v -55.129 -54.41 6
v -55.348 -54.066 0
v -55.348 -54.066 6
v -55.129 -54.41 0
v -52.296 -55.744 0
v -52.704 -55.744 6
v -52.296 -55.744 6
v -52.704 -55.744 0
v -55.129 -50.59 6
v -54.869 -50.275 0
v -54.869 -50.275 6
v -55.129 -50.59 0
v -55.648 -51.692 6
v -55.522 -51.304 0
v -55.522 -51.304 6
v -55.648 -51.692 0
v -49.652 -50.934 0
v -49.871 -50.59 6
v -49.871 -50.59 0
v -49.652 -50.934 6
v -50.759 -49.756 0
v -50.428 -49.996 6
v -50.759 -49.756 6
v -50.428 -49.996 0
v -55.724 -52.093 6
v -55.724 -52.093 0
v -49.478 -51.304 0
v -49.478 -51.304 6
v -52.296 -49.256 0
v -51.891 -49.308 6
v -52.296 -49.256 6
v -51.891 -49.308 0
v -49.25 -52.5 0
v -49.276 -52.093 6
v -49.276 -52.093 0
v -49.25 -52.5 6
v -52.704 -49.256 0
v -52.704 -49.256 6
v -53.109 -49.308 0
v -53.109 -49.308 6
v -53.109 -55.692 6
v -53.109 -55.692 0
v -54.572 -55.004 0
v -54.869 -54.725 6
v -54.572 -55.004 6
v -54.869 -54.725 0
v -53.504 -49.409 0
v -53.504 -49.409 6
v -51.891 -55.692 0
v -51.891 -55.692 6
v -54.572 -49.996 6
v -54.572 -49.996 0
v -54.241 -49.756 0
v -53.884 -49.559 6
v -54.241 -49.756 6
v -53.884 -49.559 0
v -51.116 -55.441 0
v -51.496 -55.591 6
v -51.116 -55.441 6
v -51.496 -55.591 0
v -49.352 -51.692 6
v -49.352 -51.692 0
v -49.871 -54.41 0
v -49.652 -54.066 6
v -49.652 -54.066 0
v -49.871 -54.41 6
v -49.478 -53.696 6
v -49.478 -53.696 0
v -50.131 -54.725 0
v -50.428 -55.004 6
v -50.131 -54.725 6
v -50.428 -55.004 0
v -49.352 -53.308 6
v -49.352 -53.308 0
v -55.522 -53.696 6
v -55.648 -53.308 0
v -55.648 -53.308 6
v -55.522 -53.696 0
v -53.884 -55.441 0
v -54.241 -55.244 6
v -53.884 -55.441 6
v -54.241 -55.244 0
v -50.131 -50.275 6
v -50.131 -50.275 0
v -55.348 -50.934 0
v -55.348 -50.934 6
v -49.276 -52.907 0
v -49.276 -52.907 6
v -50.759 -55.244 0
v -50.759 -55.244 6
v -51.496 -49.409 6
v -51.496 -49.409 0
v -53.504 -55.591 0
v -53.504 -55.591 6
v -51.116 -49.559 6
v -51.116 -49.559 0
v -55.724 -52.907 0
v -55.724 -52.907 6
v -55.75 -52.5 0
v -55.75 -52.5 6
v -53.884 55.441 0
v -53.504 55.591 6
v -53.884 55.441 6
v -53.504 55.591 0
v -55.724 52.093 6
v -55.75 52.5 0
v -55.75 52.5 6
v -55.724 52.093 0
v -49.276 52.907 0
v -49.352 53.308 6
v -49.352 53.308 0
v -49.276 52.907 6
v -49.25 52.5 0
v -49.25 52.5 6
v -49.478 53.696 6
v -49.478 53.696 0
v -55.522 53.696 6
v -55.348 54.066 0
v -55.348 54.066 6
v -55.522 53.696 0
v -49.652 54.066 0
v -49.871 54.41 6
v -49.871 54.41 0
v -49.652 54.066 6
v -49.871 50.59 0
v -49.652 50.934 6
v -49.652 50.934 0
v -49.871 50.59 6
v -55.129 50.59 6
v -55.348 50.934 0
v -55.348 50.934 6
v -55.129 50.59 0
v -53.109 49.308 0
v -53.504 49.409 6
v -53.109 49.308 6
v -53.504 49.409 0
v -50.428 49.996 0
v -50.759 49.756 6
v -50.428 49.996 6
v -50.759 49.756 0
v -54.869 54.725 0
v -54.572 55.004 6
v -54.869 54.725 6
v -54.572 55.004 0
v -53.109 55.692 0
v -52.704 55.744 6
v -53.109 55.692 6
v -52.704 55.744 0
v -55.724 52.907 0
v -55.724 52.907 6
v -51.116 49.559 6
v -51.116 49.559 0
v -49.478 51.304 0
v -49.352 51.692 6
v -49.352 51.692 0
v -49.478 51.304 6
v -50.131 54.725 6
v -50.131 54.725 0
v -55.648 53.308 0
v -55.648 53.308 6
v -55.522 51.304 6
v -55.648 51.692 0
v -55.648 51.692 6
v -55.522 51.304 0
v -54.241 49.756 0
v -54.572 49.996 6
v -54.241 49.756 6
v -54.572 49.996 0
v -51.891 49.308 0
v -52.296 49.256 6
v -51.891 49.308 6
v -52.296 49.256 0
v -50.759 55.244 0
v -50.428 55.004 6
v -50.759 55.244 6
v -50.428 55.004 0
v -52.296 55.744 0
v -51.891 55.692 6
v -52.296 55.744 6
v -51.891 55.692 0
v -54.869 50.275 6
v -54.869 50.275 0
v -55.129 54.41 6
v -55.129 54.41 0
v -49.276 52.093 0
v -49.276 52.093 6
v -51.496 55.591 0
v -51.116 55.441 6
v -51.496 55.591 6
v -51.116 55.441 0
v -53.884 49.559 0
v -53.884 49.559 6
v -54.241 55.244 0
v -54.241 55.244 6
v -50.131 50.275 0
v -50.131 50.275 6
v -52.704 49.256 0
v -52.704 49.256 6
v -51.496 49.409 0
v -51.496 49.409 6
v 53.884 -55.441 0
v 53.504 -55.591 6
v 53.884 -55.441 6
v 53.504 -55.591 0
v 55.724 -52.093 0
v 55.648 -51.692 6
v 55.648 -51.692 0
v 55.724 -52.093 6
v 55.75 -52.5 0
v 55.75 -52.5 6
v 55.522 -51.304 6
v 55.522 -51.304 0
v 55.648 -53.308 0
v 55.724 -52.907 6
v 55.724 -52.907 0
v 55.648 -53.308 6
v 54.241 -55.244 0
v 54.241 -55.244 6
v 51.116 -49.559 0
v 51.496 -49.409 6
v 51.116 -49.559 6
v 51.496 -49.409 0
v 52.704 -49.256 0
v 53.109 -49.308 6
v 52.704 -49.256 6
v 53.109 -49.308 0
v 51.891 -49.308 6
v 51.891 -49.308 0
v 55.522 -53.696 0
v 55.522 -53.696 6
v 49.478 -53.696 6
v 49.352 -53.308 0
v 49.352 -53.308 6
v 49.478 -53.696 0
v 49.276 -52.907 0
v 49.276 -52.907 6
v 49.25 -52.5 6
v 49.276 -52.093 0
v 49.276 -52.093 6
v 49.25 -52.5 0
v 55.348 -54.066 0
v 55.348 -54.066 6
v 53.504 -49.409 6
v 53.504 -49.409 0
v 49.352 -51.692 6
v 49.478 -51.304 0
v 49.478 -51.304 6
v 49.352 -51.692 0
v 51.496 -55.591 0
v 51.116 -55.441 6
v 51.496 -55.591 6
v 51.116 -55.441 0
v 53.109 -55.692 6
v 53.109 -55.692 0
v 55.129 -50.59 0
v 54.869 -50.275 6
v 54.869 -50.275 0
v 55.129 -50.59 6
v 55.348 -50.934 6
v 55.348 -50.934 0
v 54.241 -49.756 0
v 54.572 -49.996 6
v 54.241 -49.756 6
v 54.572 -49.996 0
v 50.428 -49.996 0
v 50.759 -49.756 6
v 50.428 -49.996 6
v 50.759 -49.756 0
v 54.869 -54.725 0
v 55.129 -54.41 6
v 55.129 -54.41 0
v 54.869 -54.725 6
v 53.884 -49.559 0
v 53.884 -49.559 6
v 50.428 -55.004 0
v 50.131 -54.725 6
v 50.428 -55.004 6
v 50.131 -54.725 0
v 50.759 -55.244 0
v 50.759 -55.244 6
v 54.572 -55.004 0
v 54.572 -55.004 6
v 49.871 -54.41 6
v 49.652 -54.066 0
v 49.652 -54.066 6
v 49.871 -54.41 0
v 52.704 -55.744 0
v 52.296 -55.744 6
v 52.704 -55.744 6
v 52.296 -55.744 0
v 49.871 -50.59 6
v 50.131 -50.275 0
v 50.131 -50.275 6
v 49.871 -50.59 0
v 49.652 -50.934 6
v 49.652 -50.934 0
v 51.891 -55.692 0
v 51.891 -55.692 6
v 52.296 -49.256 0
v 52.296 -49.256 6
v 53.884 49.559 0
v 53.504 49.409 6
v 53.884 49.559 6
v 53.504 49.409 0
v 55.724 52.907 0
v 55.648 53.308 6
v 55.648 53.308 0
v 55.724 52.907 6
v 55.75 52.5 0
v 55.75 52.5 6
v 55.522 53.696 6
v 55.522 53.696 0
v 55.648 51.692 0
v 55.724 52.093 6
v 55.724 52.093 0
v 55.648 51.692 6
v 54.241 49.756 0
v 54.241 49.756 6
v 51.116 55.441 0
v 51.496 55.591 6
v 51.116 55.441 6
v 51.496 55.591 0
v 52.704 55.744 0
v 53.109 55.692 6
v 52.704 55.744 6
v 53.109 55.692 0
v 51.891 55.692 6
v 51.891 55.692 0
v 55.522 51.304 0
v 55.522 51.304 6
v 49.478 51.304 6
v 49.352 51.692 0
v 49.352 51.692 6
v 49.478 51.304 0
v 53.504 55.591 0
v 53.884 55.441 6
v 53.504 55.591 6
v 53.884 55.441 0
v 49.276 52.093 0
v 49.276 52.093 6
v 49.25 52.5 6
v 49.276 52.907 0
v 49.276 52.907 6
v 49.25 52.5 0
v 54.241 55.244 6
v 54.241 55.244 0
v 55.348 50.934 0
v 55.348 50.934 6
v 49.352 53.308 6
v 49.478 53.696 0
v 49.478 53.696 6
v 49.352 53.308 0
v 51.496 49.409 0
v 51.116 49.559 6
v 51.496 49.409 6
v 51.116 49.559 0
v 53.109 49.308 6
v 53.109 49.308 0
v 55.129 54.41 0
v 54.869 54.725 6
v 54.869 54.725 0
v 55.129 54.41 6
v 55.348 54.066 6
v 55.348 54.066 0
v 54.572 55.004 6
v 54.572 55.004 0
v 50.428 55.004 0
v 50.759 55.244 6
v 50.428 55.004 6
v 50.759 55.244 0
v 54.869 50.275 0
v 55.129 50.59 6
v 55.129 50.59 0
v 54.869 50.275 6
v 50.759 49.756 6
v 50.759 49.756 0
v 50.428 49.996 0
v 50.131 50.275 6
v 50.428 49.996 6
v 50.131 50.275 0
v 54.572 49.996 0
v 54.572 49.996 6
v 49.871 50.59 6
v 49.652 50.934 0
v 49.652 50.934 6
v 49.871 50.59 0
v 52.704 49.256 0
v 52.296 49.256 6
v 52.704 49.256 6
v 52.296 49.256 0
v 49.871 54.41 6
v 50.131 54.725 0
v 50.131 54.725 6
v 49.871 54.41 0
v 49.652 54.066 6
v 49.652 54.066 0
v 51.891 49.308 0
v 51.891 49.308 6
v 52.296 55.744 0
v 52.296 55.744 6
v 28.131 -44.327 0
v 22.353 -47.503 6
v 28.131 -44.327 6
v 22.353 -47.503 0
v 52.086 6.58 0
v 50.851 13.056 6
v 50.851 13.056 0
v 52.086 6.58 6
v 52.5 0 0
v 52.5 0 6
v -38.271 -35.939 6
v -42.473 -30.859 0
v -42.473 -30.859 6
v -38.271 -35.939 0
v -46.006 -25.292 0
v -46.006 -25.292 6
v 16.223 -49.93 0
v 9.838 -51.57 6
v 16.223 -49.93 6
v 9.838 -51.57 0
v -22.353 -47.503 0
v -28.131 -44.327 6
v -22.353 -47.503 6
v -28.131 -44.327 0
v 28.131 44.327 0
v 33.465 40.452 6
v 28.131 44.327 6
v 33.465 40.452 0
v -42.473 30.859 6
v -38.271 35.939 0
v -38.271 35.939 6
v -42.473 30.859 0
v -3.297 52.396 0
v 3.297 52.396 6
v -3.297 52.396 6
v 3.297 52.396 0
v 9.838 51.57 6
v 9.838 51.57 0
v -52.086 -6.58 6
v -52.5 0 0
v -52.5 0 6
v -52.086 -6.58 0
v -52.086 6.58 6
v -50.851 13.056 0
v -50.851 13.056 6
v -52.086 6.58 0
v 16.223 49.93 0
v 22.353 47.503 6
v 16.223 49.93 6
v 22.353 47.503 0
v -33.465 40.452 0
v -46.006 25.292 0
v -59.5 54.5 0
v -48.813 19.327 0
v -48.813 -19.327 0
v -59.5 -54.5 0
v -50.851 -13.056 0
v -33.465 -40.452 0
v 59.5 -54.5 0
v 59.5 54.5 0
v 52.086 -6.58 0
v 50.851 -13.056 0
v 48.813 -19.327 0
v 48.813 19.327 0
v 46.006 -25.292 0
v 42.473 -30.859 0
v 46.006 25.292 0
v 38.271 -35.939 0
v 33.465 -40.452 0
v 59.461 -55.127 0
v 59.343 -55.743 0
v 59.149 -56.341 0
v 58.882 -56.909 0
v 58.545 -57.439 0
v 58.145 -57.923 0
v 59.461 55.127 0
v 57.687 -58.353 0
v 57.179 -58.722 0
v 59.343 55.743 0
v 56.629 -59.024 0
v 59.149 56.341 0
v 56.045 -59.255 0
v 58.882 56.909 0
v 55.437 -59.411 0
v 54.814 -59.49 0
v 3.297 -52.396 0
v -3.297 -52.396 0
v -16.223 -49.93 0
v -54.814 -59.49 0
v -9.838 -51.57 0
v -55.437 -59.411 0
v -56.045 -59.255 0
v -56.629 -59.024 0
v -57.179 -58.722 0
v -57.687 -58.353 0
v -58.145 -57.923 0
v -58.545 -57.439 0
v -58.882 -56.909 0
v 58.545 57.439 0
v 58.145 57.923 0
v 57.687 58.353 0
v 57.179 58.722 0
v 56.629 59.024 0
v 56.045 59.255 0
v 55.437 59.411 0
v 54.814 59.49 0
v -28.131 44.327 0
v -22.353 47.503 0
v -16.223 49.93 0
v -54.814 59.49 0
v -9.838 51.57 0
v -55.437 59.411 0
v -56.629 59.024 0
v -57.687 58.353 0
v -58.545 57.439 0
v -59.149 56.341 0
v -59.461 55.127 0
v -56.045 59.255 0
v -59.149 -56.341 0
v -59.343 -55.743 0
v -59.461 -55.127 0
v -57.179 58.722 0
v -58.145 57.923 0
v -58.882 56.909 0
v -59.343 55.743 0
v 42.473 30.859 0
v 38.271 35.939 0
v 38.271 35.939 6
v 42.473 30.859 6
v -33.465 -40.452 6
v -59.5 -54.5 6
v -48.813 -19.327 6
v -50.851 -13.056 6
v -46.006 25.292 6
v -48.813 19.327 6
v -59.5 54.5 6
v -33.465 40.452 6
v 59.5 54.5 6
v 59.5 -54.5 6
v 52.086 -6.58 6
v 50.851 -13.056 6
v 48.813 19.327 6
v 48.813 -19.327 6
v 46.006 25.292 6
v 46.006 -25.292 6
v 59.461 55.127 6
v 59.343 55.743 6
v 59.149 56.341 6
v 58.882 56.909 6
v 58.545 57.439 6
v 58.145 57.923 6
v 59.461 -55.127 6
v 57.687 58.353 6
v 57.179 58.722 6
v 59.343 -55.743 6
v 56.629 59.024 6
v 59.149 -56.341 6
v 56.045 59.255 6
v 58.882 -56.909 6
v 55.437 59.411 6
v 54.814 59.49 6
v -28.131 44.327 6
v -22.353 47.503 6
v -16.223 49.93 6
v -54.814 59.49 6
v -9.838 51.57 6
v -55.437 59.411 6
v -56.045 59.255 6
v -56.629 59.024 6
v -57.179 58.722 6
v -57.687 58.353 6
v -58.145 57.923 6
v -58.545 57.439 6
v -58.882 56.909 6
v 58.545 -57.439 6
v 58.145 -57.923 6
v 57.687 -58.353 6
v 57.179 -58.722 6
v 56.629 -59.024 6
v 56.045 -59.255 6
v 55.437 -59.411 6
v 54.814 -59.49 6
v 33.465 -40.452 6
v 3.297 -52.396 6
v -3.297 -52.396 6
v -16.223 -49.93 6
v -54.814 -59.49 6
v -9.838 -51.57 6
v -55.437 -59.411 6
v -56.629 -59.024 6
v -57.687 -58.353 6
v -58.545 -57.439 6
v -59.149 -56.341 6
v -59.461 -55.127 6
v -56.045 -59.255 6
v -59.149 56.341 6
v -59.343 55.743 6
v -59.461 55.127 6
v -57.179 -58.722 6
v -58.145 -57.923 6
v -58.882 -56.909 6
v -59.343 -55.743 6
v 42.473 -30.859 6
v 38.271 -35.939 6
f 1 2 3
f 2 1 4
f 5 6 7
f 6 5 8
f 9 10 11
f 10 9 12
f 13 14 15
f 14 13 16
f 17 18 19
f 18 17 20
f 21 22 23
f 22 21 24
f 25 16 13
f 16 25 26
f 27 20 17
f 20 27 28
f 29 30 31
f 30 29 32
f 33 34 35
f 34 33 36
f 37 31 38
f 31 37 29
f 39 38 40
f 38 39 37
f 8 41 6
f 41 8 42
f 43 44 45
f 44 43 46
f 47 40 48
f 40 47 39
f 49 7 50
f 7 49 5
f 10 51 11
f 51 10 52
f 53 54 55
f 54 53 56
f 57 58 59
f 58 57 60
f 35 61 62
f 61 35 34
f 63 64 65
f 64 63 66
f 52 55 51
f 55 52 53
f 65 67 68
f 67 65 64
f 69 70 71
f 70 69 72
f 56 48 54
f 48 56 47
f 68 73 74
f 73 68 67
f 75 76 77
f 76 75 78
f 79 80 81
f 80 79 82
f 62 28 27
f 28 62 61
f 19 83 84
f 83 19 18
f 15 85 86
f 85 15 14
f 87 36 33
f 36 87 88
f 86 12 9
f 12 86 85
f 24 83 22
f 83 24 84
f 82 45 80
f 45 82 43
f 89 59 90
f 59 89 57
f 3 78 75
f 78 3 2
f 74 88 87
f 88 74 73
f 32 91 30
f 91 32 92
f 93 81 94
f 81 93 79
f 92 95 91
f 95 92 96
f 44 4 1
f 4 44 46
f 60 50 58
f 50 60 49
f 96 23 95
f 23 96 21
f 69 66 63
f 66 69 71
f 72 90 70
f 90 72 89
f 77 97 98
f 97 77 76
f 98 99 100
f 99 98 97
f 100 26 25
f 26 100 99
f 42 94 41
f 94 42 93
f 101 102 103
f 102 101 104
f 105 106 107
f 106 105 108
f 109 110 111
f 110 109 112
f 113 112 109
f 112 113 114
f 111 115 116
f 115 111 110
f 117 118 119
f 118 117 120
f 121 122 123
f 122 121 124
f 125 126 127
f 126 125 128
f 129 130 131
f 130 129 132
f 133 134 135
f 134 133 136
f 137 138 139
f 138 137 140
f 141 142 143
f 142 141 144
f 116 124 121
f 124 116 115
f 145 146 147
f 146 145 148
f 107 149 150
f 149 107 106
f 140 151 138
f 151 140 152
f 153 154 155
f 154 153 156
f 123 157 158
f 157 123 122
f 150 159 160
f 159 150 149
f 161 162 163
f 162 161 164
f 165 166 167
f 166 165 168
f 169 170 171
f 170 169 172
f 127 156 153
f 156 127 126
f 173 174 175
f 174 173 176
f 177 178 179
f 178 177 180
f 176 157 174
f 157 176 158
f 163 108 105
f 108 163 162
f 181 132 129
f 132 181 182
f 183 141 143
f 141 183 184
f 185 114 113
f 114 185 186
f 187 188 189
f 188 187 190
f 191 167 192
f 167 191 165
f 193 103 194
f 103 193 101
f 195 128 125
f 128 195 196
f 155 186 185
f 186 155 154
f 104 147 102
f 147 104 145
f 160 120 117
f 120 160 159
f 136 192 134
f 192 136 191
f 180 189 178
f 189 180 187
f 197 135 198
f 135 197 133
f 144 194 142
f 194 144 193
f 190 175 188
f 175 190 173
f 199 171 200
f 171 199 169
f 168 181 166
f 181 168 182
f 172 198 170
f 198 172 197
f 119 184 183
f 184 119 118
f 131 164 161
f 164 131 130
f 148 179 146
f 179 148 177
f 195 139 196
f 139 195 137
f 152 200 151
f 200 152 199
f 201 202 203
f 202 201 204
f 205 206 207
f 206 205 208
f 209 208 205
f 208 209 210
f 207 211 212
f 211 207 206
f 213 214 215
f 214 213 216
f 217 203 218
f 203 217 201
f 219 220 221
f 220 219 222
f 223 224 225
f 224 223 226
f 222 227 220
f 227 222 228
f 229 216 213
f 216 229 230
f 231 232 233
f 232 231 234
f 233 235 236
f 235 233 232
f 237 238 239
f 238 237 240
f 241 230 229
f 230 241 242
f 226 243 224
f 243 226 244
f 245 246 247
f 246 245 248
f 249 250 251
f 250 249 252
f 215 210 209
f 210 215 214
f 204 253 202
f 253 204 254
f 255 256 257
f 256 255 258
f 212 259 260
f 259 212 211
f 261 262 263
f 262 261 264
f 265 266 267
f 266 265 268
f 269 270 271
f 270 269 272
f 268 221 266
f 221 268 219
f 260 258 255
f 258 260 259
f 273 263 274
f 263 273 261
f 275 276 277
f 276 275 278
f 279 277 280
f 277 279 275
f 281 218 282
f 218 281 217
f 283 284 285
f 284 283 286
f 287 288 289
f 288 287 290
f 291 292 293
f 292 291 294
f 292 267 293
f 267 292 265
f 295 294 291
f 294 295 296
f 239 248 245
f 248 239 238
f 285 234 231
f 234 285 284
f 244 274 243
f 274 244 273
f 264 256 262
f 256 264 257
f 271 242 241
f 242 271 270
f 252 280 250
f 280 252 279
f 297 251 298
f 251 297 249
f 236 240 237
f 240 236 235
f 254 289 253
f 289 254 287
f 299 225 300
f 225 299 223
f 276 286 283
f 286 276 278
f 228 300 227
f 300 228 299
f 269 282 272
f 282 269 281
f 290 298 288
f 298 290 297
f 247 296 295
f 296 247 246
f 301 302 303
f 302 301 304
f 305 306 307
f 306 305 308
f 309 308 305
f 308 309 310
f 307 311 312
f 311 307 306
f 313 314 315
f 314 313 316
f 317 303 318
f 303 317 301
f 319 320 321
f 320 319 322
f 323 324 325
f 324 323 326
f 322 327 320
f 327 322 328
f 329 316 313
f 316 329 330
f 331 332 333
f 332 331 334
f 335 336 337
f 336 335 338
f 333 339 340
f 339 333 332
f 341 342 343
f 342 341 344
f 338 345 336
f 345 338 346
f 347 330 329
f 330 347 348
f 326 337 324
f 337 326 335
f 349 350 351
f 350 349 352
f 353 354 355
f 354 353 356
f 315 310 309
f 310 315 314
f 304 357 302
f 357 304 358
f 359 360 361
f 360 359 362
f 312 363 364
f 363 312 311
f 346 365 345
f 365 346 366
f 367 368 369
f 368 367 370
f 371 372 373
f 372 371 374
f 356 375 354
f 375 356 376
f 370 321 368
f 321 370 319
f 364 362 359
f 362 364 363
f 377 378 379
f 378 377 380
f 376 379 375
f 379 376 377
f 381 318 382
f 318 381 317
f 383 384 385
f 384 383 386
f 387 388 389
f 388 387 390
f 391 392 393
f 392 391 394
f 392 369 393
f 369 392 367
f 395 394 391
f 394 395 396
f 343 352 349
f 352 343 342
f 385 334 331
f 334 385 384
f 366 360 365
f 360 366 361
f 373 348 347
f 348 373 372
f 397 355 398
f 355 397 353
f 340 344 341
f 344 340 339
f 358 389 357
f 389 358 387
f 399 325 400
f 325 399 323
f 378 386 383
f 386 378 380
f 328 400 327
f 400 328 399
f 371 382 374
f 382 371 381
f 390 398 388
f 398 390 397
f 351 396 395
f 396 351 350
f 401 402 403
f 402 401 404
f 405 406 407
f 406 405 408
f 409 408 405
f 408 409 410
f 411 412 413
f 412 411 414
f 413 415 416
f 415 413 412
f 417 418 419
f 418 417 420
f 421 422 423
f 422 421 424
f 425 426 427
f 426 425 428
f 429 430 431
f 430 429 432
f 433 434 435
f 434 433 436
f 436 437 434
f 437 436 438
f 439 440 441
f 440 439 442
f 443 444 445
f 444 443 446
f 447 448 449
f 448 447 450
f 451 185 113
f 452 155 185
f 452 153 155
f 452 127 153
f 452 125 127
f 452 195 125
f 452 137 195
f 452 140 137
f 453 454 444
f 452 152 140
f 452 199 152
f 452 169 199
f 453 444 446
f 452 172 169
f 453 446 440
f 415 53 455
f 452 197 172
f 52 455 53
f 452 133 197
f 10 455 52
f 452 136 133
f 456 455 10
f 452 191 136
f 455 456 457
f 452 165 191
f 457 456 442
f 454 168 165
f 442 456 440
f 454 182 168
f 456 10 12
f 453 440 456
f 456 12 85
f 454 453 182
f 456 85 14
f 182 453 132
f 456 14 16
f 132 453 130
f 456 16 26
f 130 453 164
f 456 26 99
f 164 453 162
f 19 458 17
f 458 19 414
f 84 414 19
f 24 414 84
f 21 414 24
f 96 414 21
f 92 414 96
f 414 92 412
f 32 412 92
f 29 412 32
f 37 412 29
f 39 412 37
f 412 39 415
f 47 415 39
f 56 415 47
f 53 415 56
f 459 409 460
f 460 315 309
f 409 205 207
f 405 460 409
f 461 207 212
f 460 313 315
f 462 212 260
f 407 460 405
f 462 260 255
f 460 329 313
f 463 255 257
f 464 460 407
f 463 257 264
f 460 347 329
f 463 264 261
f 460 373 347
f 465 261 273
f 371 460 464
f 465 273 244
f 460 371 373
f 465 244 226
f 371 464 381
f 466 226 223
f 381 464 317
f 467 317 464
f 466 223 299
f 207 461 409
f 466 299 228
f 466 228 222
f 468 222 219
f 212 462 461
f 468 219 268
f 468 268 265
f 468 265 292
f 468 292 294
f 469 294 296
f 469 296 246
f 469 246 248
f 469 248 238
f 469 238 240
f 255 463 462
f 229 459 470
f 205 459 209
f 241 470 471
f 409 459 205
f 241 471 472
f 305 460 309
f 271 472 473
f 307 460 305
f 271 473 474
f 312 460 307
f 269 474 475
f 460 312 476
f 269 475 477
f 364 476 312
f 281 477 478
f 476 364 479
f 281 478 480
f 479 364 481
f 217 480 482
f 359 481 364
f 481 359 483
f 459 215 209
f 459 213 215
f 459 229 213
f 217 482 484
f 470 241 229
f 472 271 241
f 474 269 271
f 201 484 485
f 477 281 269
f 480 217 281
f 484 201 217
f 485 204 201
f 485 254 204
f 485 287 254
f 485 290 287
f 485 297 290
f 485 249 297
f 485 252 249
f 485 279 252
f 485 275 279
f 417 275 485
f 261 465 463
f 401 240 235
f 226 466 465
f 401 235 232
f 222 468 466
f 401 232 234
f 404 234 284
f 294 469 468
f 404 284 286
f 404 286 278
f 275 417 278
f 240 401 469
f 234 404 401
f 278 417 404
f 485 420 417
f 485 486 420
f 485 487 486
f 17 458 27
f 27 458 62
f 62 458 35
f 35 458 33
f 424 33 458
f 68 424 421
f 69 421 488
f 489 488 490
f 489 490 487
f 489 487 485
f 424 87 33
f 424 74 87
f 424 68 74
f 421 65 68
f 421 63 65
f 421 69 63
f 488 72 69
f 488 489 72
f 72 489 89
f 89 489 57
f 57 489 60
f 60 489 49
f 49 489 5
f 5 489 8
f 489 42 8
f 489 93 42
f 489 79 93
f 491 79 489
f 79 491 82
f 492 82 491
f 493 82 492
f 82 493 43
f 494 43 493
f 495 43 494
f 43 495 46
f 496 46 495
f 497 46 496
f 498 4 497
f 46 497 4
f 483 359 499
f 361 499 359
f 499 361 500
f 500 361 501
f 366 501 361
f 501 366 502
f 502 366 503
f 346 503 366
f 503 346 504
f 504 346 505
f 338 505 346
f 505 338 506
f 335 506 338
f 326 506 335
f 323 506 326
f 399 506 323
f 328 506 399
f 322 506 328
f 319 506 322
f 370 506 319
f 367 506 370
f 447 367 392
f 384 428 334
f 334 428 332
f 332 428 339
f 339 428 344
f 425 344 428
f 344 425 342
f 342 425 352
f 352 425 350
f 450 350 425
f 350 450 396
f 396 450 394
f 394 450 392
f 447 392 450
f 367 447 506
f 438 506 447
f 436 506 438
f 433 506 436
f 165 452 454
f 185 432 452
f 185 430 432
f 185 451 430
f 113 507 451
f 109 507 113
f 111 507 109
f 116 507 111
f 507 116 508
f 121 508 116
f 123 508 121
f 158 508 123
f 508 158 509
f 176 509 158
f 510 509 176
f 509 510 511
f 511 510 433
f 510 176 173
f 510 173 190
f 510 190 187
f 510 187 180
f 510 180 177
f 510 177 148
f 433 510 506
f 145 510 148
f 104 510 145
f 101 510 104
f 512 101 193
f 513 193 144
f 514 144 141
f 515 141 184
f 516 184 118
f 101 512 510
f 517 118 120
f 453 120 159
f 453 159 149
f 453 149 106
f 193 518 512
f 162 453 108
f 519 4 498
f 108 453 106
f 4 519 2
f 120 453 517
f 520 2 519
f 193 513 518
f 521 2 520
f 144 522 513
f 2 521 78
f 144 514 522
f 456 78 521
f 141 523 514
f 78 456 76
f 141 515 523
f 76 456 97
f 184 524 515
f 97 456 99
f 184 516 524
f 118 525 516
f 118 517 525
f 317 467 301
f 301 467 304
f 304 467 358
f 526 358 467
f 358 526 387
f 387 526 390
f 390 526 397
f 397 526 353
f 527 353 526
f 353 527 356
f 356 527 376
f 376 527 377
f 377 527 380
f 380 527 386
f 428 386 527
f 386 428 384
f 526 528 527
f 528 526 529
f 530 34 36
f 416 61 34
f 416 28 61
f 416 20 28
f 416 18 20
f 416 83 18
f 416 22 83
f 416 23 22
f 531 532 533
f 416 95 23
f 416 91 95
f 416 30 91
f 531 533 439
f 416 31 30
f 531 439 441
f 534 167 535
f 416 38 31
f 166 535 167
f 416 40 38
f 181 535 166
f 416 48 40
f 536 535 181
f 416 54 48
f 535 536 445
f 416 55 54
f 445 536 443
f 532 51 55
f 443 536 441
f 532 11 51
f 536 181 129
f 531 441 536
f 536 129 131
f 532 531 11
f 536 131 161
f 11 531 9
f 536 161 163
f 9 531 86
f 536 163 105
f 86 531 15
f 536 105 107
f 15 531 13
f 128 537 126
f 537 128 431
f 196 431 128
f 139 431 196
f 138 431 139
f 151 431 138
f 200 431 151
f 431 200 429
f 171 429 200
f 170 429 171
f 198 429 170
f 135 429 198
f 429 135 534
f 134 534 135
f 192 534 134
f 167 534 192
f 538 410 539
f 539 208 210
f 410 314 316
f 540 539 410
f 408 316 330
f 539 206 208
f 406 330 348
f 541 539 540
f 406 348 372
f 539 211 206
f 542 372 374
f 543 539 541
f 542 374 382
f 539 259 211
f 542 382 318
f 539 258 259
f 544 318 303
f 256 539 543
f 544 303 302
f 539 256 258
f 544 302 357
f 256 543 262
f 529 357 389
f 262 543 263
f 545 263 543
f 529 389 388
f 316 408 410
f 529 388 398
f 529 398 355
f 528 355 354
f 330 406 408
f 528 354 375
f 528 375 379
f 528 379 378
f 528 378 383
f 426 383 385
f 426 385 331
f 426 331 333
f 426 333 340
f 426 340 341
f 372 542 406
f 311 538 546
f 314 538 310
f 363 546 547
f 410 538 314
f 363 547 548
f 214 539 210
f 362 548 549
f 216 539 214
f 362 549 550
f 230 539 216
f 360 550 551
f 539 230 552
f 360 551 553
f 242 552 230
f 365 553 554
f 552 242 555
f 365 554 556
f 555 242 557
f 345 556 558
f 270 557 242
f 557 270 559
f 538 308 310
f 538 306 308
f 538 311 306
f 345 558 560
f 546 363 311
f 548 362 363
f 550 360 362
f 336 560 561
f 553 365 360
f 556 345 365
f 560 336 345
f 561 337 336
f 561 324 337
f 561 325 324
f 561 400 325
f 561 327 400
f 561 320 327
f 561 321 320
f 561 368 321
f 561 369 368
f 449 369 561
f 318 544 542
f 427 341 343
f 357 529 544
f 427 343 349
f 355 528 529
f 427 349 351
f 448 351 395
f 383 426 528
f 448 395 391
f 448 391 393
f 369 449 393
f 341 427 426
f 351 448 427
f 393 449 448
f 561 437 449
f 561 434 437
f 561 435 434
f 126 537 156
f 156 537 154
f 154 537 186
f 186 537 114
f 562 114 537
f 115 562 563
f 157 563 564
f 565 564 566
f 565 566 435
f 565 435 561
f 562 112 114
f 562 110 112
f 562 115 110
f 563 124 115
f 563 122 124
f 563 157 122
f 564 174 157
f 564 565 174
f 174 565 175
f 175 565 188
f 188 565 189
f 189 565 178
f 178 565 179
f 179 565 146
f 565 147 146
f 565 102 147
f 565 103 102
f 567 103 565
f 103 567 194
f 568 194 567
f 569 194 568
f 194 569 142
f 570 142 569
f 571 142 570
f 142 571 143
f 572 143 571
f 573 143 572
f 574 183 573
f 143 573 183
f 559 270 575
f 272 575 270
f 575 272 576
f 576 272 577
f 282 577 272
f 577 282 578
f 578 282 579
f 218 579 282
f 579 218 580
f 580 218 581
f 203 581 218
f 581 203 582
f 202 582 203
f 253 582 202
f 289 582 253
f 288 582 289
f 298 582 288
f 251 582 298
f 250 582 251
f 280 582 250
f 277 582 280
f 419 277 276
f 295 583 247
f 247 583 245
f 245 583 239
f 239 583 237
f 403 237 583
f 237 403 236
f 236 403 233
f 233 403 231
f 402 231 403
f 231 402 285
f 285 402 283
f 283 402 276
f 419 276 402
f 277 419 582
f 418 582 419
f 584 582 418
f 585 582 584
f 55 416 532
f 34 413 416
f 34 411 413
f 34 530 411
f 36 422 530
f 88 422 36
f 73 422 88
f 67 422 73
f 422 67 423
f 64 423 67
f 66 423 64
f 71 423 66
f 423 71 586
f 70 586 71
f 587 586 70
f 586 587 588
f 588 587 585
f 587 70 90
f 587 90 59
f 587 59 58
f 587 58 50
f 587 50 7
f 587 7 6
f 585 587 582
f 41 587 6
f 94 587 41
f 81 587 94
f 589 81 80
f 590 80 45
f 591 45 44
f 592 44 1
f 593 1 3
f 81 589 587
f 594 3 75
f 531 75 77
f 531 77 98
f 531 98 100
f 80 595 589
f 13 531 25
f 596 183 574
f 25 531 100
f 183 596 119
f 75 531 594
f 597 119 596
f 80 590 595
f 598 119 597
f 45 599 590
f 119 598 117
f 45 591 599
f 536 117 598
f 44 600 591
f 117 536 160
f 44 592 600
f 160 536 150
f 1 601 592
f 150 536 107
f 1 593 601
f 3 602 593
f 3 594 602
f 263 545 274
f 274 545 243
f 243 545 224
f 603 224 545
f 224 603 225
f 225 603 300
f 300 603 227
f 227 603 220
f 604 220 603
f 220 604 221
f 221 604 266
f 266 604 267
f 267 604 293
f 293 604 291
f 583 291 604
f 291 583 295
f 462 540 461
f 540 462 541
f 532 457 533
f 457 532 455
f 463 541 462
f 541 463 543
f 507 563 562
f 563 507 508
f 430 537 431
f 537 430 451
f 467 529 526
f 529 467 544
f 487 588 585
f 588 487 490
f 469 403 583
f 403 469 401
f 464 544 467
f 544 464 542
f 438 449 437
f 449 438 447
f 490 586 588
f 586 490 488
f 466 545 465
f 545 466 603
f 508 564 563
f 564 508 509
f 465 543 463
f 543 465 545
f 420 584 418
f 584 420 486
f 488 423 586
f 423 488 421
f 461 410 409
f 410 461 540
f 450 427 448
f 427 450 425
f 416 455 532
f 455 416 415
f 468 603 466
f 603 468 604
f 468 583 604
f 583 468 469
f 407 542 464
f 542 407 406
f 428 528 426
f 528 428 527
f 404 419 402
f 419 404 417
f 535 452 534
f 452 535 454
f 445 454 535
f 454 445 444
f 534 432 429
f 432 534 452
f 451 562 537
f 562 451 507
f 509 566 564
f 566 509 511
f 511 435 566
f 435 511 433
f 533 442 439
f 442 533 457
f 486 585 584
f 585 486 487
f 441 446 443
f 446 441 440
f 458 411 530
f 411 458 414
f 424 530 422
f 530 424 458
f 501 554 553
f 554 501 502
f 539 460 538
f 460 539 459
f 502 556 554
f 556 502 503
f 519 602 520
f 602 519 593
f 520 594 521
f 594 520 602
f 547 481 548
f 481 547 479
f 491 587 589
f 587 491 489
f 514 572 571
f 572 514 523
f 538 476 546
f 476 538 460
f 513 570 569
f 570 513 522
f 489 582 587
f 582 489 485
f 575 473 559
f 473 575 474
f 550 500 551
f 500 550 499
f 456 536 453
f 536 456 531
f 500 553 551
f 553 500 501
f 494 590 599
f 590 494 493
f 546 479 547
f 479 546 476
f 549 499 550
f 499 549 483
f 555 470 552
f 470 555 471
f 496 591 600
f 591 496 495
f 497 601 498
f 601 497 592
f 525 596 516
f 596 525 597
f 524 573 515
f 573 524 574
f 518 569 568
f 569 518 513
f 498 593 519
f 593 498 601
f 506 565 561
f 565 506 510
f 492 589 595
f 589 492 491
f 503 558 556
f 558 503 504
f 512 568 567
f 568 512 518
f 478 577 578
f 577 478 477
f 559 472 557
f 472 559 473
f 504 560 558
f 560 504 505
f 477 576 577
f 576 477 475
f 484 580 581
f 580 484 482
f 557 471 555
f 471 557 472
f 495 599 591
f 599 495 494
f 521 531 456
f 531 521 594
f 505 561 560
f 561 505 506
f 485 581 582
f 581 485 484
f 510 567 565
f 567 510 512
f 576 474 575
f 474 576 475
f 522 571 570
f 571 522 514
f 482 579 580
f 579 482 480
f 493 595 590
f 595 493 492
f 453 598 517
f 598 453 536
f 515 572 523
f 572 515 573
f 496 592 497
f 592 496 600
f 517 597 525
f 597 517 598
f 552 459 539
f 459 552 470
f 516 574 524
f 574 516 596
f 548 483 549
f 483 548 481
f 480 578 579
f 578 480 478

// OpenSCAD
$fn = 50;


difference() {
	union() {
		hull() {
			translate(v = [-54.5000000000, 54.5000000000, 0]) {
				cylinder(h = 6, r = 5);
			}
			translate(v = [54.5000000000, 54.5000000000, 0]) {
				cylinder(h = 6, r = 5);
			}
			translate(v = [-54.5000000000, -54.5000000000, 0]) {
				cylinder(h = 6, r = 5);
			}
			translate(v = [54.5000000000, -54.5000000000, 0]) {
				cylinder(h = 6, r = 5);
			}
		}
	}
	union() {
		#translate(v = [-52.5000000000, -52.5000000000, -100.0000000000]) {
			cylinder(h = 200, r = 3.2500000000);
		}
		#translate(v = [-52.5000000000, 52.5000000000, -100.0000000000]) {
			cylinder(h = 200, r = 3.2500000000);
		}
		#translate(v = [52.5000000000, -52.5000000000, -100.0000000000]) {
			cylinder(h = 200, r = 3.2500000000);
		}
		#translate(v = [52.5000000000, 52.5000000000, -100.0000000000]) {
			cylinder(h = 200, r = 3.2500000000);
		}
		#cylinder(h = 6, r = 52.5000000000);
	}
}
